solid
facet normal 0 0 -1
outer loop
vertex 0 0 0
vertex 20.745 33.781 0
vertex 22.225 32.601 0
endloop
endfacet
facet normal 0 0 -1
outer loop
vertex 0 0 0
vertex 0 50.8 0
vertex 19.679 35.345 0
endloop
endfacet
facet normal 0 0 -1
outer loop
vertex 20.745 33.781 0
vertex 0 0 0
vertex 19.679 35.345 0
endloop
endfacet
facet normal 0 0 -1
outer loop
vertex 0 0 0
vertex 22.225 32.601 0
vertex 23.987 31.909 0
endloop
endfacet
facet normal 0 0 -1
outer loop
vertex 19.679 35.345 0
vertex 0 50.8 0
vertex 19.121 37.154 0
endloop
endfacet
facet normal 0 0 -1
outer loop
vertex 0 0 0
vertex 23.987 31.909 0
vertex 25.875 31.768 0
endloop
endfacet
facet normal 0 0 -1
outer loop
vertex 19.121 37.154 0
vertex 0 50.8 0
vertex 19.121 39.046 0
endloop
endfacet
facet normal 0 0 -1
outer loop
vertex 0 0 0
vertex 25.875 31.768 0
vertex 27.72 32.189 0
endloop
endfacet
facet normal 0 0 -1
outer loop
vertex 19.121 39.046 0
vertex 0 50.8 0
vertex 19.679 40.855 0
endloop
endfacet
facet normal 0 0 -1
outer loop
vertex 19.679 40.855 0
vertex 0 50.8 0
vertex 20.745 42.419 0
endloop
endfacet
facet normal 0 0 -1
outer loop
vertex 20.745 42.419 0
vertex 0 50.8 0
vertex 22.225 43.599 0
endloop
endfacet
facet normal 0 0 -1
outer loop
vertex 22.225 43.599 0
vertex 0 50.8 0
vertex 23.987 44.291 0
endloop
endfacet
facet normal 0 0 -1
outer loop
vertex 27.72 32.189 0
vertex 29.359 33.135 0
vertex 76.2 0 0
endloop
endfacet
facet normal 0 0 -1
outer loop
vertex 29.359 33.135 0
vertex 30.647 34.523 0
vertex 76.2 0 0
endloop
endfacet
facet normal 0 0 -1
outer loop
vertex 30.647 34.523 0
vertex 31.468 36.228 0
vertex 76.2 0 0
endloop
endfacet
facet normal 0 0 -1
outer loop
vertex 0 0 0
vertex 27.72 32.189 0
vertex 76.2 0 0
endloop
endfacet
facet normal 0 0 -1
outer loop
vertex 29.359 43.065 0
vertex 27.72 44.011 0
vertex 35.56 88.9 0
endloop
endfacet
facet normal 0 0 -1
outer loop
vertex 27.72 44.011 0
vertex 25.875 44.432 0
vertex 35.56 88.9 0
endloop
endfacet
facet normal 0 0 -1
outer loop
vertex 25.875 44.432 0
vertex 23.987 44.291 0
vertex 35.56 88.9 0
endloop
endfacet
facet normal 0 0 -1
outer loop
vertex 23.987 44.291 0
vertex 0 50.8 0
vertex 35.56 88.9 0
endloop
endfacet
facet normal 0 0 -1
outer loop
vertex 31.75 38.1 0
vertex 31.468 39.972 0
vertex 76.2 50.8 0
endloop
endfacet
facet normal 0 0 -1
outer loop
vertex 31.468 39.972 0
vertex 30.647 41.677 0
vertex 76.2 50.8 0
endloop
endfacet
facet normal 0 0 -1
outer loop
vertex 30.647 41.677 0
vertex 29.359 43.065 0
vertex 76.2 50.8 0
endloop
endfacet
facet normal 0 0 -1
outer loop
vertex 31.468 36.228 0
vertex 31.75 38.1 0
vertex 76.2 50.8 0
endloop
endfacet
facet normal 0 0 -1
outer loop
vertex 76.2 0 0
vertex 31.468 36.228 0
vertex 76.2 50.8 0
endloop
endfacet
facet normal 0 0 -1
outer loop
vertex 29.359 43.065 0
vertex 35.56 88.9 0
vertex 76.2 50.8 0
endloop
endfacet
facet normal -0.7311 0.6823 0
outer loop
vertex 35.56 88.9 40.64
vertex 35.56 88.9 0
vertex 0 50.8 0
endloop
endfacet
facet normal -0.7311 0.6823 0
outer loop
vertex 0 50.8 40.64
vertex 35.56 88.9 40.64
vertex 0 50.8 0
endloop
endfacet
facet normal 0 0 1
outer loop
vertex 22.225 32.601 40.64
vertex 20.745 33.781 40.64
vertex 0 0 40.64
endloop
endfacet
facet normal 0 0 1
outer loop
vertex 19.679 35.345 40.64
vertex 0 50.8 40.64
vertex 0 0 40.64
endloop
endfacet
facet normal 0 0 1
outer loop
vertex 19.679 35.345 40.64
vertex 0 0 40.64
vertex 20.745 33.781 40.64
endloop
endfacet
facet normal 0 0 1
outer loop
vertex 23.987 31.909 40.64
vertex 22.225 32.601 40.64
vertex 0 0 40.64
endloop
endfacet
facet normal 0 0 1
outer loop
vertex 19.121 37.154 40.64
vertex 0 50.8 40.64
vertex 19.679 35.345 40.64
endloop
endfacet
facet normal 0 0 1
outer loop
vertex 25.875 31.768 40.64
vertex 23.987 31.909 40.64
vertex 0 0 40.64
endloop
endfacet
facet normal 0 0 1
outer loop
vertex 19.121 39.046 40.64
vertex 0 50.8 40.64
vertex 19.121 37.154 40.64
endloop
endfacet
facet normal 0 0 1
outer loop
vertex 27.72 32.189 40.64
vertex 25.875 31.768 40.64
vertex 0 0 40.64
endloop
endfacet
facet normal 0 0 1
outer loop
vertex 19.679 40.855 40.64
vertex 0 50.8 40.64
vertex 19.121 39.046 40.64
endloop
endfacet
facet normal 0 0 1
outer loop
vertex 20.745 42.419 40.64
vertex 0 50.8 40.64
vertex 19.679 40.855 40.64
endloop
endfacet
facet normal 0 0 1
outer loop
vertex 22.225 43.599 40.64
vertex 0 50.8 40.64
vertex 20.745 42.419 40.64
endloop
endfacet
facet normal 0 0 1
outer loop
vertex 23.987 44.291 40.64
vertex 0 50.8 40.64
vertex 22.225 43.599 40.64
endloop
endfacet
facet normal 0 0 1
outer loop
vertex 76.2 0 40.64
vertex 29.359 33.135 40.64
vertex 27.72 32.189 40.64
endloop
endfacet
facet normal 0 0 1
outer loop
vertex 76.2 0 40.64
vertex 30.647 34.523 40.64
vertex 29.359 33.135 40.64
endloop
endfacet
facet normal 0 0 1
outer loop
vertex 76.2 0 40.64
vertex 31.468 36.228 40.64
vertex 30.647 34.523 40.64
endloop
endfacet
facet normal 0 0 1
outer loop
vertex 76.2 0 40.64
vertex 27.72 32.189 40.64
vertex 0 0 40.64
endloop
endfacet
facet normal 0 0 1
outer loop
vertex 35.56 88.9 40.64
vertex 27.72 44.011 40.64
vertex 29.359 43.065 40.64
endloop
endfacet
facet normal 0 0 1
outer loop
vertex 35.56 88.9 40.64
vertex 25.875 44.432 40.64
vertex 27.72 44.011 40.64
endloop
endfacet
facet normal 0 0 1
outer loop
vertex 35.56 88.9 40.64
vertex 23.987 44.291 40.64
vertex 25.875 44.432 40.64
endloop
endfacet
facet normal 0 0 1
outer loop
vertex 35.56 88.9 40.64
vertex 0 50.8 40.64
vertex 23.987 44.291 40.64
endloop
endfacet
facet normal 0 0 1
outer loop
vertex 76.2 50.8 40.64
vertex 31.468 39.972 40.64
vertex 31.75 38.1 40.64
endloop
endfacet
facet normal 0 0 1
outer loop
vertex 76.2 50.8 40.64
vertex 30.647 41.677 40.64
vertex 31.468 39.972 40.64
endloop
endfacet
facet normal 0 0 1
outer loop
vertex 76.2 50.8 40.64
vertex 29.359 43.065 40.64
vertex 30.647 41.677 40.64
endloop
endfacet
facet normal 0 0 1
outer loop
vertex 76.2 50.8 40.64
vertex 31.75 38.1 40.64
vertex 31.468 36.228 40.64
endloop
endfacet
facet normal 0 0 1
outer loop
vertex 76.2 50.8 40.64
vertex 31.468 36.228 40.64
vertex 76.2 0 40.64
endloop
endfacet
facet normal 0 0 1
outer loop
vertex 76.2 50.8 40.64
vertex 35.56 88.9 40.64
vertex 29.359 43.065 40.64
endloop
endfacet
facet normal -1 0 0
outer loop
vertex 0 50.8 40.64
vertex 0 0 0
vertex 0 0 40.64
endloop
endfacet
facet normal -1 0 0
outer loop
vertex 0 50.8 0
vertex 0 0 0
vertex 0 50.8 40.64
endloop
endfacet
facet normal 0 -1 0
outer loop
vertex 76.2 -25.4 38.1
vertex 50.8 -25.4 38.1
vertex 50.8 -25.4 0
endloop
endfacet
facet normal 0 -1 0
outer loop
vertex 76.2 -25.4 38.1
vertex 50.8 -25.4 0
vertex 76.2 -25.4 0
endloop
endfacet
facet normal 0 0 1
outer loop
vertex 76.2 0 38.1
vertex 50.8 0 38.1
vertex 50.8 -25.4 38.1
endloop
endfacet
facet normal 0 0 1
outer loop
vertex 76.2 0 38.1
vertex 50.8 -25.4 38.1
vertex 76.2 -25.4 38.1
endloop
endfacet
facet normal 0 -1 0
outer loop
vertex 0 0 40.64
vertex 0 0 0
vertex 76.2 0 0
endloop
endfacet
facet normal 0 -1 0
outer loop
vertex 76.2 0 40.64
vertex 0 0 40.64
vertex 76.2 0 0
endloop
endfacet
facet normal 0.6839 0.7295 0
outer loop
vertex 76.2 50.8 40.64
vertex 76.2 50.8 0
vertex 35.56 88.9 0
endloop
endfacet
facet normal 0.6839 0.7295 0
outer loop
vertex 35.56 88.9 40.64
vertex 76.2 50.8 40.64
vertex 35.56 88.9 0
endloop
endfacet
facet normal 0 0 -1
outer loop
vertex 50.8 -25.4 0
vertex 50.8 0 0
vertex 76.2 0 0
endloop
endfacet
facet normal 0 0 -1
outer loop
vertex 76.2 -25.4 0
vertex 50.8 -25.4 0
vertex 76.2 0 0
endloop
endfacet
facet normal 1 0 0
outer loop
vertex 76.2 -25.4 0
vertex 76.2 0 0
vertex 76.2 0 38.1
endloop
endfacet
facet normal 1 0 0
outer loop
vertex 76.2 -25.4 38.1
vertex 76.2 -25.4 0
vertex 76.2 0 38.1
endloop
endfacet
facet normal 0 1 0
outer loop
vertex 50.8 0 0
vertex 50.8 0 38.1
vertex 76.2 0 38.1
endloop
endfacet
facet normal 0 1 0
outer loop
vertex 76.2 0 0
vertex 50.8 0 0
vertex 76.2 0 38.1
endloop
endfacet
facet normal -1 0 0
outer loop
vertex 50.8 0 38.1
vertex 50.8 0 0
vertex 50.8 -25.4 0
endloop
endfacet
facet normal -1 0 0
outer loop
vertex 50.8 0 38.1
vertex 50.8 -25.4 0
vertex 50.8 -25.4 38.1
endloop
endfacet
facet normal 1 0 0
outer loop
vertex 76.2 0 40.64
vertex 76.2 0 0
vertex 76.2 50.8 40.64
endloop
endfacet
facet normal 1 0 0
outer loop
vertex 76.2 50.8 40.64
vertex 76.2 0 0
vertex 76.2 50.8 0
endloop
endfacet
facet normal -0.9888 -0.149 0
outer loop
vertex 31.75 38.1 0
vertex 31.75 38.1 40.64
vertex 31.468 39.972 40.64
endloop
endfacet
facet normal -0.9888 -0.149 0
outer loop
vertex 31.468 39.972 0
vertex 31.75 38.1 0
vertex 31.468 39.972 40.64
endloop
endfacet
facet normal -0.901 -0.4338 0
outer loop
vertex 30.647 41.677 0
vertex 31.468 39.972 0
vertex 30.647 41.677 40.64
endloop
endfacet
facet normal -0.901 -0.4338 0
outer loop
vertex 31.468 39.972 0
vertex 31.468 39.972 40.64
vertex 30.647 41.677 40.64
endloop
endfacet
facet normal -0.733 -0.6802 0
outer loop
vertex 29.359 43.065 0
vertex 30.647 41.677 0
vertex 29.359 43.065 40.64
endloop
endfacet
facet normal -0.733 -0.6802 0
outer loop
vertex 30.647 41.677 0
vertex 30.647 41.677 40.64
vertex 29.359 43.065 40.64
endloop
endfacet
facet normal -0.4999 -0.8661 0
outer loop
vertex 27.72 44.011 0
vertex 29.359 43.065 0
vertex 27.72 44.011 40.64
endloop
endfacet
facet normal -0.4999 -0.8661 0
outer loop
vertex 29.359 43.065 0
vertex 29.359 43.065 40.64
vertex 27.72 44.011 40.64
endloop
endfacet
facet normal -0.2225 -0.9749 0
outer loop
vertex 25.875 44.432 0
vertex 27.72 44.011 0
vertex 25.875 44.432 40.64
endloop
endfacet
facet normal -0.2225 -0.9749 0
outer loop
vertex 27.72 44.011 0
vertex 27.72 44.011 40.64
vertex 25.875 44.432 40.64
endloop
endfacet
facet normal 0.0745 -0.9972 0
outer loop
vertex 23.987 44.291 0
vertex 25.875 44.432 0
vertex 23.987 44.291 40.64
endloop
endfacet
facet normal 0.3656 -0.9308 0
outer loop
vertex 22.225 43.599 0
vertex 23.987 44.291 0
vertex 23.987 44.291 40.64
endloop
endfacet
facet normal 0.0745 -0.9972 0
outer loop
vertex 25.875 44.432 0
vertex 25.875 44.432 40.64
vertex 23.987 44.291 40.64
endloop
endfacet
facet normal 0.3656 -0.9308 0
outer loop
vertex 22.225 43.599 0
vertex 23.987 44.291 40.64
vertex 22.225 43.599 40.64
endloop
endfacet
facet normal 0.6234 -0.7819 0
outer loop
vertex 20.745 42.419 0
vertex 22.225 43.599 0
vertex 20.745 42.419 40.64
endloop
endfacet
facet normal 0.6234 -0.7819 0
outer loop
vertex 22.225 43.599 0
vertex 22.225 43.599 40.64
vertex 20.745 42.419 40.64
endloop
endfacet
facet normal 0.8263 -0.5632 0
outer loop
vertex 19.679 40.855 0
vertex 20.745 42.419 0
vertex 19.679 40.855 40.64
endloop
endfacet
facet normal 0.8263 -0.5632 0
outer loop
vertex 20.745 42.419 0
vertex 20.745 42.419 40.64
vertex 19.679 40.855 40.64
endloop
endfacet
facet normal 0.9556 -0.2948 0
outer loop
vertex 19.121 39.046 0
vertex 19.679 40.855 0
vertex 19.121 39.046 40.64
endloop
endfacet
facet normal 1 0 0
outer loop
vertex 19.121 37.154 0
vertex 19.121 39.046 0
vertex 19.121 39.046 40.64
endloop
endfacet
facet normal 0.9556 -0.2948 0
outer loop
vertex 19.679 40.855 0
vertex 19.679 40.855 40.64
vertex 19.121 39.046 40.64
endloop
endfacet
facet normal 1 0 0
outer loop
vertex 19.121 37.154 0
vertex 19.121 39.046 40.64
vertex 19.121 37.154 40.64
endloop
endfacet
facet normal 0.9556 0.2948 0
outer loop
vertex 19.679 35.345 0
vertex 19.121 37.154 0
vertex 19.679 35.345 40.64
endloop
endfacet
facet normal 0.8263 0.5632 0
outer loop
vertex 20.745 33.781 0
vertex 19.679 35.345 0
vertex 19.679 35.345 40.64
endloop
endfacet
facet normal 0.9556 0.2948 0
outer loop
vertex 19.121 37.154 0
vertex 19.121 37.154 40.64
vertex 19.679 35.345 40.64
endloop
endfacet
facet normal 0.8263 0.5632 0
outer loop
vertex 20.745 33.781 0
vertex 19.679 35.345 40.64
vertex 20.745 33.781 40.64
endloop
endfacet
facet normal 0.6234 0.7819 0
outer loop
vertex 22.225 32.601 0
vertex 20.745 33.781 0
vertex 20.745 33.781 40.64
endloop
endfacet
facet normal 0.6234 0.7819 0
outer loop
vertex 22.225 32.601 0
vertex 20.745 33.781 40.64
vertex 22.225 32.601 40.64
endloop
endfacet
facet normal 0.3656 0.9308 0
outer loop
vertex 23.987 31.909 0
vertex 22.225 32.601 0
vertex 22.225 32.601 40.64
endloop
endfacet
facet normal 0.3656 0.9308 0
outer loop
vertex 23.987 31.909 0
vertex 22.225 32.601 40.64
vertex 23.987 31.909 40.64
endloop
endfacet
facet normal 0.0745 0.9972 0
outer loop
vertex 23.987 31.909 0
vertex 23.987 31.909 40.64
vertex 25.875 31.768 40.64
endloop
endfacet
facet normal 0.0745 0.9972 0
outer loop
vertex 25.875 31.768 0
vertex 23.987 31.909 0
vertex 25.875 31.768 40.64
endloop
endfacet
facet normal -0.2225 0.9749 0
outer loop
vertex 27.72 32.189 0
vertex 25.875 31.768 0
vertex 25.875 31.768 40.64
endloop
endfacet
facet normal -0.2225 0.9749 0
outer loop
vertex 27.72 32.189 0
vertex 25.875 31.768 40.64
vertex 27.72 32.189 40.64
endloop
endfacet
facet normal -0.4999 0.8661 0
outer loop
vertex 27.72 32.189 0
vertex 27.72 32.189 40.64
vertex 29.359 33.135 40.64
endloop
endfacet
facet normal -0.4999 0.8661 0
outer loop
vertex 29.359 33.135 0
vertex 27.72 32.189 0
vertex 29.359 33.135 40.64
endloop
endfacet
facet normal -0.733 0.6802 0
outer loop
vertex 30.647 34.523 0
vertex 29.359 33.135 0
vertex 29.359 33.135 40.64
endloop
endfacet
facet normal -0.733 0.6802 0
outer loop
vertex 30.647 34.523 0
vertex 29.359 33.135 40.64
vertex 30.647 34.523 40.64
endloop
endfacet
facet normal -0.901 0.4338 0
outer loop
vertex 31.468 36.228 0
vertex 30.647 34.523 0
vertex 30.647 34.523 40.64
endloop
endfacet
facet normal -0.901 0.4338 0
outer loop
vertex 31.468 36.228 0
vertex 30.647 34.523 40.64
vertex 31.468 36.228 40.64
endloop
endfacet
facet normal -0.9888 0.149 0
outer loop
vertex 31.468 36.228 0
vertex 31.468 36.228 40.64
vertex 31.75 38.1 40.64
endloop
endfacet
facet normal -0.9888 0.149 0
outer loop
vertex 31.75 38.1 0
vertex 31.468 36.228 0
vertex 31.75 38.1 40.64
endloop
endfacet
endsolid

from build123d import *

# Parameters (mm, degrees)
F0_W     = 76.2
F0_H     = 50.8
F1_DEPTH = 40.64
F2_R     = 6.35
F3_DEPTH = 40.641
F4_W     = 25.4
F4_H     = 38.1
F5_DEPTH = 25.4


with BuildPart() as f1:
    # F0 (on Top) → F1 (new body)
    with BuildSketch(Plane.XY):
        with Locations((38.1, 25.4)):
            Rectangle(F0_W, F0_H)
        Polygon((35.56, 88.9), (0, 50.8), (76.2, 50.8), align=None)
    extrude(amount=F1_DEPTH)

    # F2 (on face) → F3 (cut, through all)
    with BuildSketch(Plane.XY.offset(40.64)):
        with Locations((25.4, 38.1)):
            Circle(F2_R)
    extrude(amount=-F3_DEPTH, mode=Mode.SUBTRACT)


with BuildPart() as f5:
    # F4 (on face) → F5 (new body)
    with BuildSketch(Plane.XZ):
        with Locations((63.5, 19.05)):
            Rectangle(F4_W, F4_H)
    extrude(amount=F5_DEPTH)


solid = Compound([f1.part, f5.part])
